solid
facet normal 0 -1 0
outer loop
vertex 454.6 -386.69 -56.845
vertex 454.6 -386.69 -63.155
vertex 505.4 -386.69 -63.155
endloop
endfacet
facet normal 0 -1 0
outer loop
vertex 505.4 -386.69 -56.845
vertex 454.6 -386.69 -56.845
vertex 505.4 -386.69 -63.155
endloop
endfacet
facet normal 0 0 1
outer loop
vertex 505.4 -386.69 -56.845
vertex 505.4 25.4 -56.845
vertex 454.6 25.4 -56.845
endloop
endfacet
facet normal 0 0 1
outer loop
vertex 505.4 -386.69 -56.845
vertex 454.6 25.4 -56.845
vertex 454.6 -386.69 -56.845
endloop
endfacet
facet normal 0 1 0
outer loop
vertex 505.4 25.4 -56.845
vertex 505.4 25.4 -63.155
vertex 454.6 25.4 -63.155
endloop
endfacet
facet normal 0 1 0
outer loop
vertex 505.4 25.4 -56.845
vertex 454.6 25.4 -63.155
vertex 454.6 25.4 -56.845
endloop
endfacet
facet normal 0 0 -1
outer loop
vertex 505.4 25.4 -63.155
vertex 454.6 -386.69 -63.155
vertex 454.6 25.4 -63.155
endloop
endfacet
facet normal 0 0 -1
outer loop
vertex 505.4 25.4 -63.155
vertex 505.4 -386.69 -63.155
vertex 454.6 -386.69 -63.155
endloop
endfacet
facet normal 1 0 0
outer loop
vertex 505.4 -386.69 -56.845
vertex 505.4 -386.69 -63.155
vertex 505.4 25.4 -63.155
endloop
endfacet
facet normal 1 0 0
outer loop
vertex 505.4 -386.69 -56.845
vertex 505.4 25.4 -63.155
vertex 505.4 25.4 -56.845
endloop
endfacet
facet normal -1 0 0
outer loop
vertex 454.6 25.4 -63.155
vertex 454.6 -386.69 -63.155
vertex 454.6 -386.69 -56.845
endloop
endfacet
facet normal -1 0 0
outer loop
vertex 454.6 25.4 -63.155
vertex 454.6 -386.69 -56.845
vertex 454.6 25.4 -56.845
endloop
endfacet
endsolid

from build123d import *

# Parameters (mm, degrees)
CROQUIS2_W              = 6.31
CROQUIS2_H              = 50.8
CROQUIS3_W              = 174.155
CROQUIS3_H              = 6.31
CORTAR_EXTRUIR1_DEPTH   = 70
CROQUIS4_W              = 6.31
CROQUIS4_H              = 50.8
SALIENTE_EXTRUIR1_DEPTH = 40
CROQUIS5_R              = 6.35
CORTAR_EXTRUIR2_DEPTH   = 10
CROQUIS6_W              = 50.8
CROQUIS6_H              = 6.31
SALIENTE_EXTRUIR2_DEPTH = 50.8
CROQUIS7_W              = 40
CROQUIS7_H              = 50.8
CORTAR_EXTRUIR3_DEPTH   = 10
CROQUIS9_W              = 337.555
CROQUIS9_H              = 50.8
CORTAR_EXTRUIR4_DEPTH   = 67


with BuildPart() as part:
    # Barrer1: sweep along a curve in space
    with BuildLine() as barrer1_path:
        Line((0, 0, 0), (171, 0, 0))
        Line((171, 0, 0), (171, 0, -60))
        Line((171, 0, -60), (480, 0, -60))
        Line((480, 0, -60), (480, -386.69, -60))
    # Croquis2 → Barrer1 (sweep)
    with BuildSketch(Plane(origin=(0, 0, 0), x_dir=(0, 0, -1), z_dir=(1, 0, 0))):
        Rectangle(CROQUIS2_W, CROQUIS2_H)
    sweep(path=barrer1_path.line, transition=Transition.RIGHT)

    # Croquis3 → Cortar-Extruir1 (cut)
    with BuildSketch(Plane.XZ.offset(25.4)):
        with Locations((87.0775, 0)):
            Rectangle(CROQUIS3_W, CROQUIS3_H)
    extrude(amount=-CORTAR_EXTRUIR1_DEPTH, mode=Mode.SUBTRACT)

    # Croquis4 → Saliente-Extruir1 (add)
    with BuildSketch(Plane.XY.offset(-56.845)):
        with Locations((457.755, -361.29)):
            Rectangle(CROQUIS4_W, CROQUIS4_H)
    extrude(amount=SALIENTE_EXTRUIR1_DEPTH)

    # Croquis5 → Cortar-Extruir2 (cut)
    with BuildSketch(Plane(origin=(460.91, 0, 0), x_dir=(0, 0, -1), z_dir=(1, 0, 0))):
        with Locations((34.155, -346.6)):
            Circle(CROQUIS5_R)
        with Locations((34.155, -378.6)):
            Circle(CROQUIS5_R)
    extrude(amount=-CORTAR_EXTRUIR2_DEPTH, mode=Mode.SUBTRACT)

    # Croquis6 → Saliente-Extruir2 (add)
    with BuildSketch(Plane.ZY.offset(-167.845)):
        with Locations((-28.555, 22.245)):
            Rectangle(CROQUIS6_W, CROQUIS6_H)
    extrude(amount=SALIENTE_EXTRUIR2_DEPTH)

    # Croquis7 → Cortar-Extruir3 (cut)
    with BuildSketch(Plane(origin=(460.91, 0, 0), x_dir=(0, 0, -1), z_dir=(1, 0, 0))):
        with Locations((36.845, -361.29)):
            Rectangle(CROQUIS7_W, CROQUIS7_H)
    extrude(amount=-CORTAR_EXTRUIR3_DEPTH, mode=Mode.SUBTRACT)

    # Croquis9 → Cortar-Extruir4 (cut)
    with BuildSketch(Plane(origin=(0, 0, -63.155), x_dir=(-1, 0, 0), z_dir=(0, 0, -1))):
        with Locations((-285.8225, 0)):
            Rectangle(CROQUIS9_W, CROQUIS9_H)
    extrude(amount=-CORTAR_EXTRUIR4_DEPTH, mode=Mode.SUBTRACT)


solid = part.part
